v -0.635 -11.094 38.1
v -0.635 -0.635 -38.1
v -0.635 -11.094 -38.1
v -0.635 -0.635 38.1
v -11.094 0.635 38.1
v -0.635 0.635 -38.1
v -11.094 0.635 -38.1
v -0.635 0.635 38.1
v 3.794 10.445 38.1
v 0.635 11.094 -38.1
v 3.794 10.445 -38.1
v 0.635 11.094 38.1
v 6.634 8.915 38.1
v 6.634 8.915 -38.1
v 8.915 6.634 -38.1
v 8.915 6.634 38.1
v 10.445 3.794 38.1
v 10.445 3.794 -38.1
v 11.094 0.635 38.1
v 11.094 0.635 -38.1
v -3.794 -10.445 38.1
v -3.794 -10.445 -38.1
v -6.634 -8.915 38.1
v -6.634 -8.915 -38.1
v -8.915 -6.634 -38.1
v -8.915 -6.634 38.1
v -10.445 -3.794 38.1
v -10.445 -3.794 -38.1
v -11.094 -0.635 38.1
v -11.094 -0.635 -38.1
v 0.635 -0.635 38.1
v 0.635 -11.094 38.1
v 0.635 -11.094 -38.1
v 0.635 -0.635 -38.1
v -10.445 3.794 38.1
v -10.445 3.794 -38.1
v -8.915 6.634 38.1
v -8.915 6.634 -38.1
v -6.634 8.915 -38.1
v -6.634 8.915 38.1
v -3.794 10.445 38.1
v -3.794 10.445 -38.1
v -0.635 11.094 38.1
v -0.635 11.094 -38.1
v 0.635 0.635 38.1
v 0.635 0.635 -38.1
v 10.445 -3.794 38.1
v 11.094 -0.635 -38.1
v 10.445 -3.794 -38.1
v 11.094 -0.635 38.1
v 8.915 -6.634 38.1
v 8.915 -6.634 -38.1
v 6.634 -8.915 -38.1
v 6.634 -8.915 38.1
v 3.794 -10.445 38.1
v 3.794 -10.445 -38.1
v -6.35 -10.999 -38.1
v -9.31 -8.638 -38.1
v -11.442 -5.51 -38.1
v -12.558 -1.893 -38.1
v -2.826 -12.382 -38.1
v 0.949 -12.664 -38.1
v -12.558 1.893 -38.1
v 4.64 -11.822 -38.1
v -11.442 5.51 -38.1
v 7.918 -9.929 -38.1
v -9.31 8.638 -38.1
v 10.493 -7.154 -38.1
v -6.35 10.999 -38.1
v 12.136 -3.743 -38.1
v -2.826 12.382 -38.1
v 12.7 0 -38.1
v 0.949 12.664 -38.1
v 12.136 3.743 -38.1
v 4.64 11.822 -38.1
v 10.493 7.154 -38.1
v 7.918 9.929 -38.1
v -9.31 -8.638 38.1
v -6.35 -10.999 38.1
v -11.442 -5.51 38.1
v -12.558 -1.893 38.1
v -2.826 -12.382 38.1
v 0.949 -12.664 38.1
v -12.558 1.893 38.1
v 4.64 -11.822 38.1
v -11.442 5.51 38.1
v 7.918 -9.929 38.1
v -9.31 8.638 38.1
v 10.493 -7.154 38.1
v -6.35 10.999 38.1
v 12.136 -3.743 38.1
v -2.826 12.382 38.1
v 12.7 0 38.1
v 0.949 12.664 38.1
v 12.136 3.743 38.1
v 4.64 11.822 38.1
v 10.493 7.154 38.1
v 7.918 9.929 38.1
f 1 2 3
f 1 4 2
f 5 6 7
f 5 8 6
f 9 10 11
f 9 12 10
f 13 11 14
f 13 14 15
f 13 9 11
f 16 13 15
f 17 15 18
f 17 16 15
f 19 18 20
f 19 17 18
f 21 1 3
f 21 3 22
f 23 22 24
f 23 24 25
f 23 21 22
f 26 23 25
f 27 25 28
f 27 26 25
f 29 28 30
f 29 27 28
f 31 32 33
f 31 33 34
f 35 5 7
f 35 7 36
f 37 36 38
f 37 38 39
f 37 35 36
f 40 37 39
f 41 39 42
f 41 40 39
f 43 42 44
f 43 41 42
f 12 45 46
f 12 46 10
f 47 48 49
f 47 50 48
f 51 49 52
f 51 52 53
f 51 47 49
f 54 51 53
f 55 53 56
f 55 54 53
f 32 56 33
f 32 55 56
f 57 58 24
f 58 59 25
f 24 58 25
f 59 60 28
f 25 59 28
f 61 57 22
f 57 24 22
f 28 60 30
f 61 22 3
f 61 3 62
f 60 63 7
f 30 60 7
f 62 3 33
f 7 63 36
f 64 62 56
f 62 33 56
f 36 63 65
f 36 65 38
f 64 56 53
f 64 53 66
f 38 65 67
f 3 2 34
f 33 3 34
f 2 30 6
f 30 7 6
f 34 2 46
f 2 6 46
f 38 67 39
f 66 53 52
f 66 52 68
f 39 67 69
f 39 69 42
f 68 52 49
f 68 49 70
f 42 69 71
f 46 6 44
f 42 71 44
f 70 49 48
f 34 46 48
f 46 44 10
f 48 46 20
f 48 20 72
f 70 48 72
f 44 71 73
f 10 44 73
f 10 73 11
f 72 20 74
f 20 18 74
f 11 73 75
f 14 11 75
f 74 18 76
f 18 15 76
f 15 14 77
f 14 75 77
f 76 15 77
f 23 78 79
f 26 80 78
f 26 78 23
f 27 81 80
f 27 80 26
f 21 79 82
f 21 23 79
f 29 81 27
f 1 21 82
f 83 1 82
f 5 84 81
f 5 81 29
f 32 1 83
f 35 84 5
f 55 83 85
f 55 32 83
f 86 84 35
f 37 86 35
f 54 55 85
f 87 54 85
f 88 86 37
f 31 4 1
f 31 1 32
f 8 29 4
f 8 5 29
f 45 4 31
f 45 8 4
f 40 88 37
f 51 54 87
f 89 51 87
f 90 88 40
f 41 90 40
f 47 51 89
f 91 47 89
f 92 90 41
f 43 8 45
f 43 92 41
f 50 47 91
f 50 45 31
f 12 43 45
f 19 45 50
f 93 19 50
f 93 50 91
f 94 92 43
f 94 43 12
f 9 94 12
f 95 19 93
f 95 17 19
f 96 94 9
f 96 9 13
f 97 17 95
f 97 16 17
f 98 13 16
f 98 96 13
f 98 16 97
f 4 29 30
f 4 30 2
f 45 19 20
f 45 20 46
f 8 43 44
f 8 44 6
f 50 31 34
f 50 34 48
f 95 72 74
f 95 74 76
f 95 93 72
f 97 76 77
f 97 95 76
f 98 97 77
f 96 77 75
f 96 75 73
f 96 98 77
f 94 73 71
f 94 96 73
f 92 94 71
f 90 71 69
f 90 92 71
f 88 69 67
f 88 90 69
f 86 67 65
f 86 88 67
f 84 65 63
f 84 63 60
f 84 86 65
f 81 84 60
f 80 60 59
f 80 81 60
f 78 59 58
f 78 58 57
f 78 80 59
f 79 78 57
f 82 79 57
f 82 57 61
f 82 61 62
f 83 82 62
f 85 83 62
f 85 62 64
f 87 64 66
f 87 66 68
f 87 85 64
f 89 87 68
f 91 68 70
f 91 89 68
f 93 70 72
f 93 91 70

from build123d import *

# Parameters (mm, degrees)
F0_R     = 12.7
F0_W     = 1.27
F0_H     = 1.27
F1_DEPTH = 38.1


with BuildPart() as f1:
    # F0 (on Top) → F1 (new body, symmetric)
    with BuildSketch(Plane.XY):
        Circle(F0_R)
        with BuildLine():
            Line((11.1125, 0.635), (11.1125, 0))
            Line((11.1125, 0), (11.1125, -0.635))
            Line((11.1125, -0.635), (11.0943423081, -0.635))
            ThreePointArc((11.0943423081, -0.635), (7.8577241059, -7.8577241059), (0.635, -11.0943423081))
            Line((0.635, -11.0943423081), (0.635, -11.1125))
            Line((0.635, -11.1125), (0, -11.1125))
            Line((0, -11.1125), (-0.635, -11.1125))
            Line((-0.635, -11.1125), (-0.635, -11.0943423081))
            ThreePointArc((-0.635, -11.0943423081), (-7.8577241059, -7.8577241059), (-11.0943423081, -0.635))
            Line((-11.0943423081, -0.635), (-11.1125, -0.635))
            Line((-11.1125, -0.635), (-11.1125, 0))
            Line((-11.1125, 0), (-11.1125, 0.635))
            Line((-11.1125, 0.635), (-11.0943423081, 0.635))
            ThreePointArc((-11.0943423081, 0.635), (-7.8577241059, 7.8577241059), (-0.635, 11.0943423081))
            Line((-0.635, 11.0943423081), (-0.635, 11.1125))
            Line((-0.635, 11.1125), (0, 11.1125))
            Line((0, 11.1125), (0.635, 11.1125))
            Line((0.635, 11.1125), (0.635, 11.0943423081))
            ThreePointArc((0.635, 11.0943423081), (7.8577241059, 7.8577241059), (11.0943423081, 0.635))
            Line((11.0943423081, 0.635), (11.1125, 0.635))
        make_face(mode=Mode.SUBTRACT)
        with BuildLine():
            Line((-0.635, -0.635), (-0.635, 0.635))
            Line((-0.635, 0.635), (-11.0943423081, 0.635))
            ThreePointArc((-11.0943423081, 0.635), (-11.1079596495, 0.3176297773), (-11.1125, 0))
            ThreePointArc((-11.1125, 0), (-11.1079596495, -0.3176297773), (-11.0943423081, -0.635))
            Line((-11.0943423081, -0.635), (-0.635, -0.635))
        make_face()
        with BuildLine():
            Line((0.635, 0.635), (0.635, 11.0943423081))
            ThreePointArc((0.635, 11.0943423081), (0.3176297773, 11.1079596495), (0, 11.1125))
            ThreePointArc((0, 11.1125), (-0.3176297773, 11.1079596495), (-0.635, 11.0943423081))
            Line((-0.635, 11.0943423081), (-0.635, 0.635))
            Line((-0.635, 0.635), (0.635, 0.635))
        make_face()
        with BuildLine():
            ThreePointArc((0, -11.1125), (0.3176297773, -11.1079596495), (0.635, -11.0943423081))
            Line((0.635, -11.0943423081), (0.635, -0.635))
            Line((0.635, -0.635), (-0.635, -0.635))
            Line((-0.635, -0.635), (-0.635, -11.0943423081))
            ThreePointArc((-0.635, -11.0943423081), (-0.3176297773, -11.1079596495), (0, -11.1125))
        make_face()
        with BuildLine():
            ThreePointArc((11.0943423081, -0.635), (11.1079596495, -0.3176297773), (11.1125, 0))
            ThreePointArc((11.1125, 0), (11.1079596495, 0.3176297773), (11.0943423081, 0.635))
            Line((11.0943423081, 0.635), (0.635, 0.635))
            Line((0.635, 0.635), (0.635, -0.635))
            Line((0.635, -0.635), (11.0943423081, -0.635))
        make_face()
        Rectangle(F0_W, F0_H)
        with BuildLine():
            ThreePointArc((-0.635, 11.0943423081), (-0.3176297773, 11.1079596495), (0, 11.1125))
            Line((0, 11.1125), (-0.635, 11.1125))
            Line((-0.635, 11.1125), (-0.635, 11.0943423081))
        make_face()
        with BuildLine():
            ThreePointArc((0, 11.1125), (0.3176297773, 11.1079596495), (0.635, 11.0943423081))
            Line((0.635, 11.0943423081), (0.635, 11.1125))
            Line((0.635, 11.1125), (0, 11.1125))
        make_face()
        with BuildLine():
            ThreePointArc((-11.1125, 0), (-11.1079596495, 0.3176297773), (-11.0943423081, 0.635))
            Line((-11.0943423081, 0.635), (-11.1125, 0.635))
            Line((-11.1125, 0.635), (-11.1125, 0))
        make_face()
        with BuildLine():
            Line((-11.1125, -0.635), (-11.0943423081, -0.635))
            ThreePointArc((-11.0943423081, -0.635), (-11.1079596495, -0.3176297773), (-11.1125, 0))
            Line((-11.1125, 0), (-11.1125, -0.635))
        make_face()
        with BuildLine():
            Line((11.1125, -0.635), (11.1125, 0))
            ThreePointArc((11.1125, 0), (11.1079596495, -0.3176297773), (11.0943423081, -0.635))
            Line((11.0943423081, -0.635), (11.1125, -0.635))
        make_face()
        with BuildLine():
            ThreePointArc((11.0943423081, 0.635), (11.1079596495, 0.3176297773), (11.1125, 0))
            Line((11.1125, 0), (11.1125, 0.635))
            Line((11.1125, 0.635), (11.0943423081, 0.635))
        make_face()
        with BuildLine():
            Line((0.635, -11.1125), (0.635, -11.0943423081))
            ThreePointArc((0.635, -11.0943423081), (0.3176297773, -11.1079596495), (0, -11.1125))
            Line((0, -11.1125), (0.635, -11.1125))
        make_face()
        with BuildLine():
            Line((-0.635, -11.1125), (0, -11.1125))
            ThreePointArc((0, -11.1125), (-0.3176297773, -11.1079596495), (-0.635, -11.0943423081))
            Line((-0.635, -11.0943423081), (-0.635, -11.1125))
        make_face()
    extrude(amount=F1_DEPTH, both=True)


solid = f1.part
